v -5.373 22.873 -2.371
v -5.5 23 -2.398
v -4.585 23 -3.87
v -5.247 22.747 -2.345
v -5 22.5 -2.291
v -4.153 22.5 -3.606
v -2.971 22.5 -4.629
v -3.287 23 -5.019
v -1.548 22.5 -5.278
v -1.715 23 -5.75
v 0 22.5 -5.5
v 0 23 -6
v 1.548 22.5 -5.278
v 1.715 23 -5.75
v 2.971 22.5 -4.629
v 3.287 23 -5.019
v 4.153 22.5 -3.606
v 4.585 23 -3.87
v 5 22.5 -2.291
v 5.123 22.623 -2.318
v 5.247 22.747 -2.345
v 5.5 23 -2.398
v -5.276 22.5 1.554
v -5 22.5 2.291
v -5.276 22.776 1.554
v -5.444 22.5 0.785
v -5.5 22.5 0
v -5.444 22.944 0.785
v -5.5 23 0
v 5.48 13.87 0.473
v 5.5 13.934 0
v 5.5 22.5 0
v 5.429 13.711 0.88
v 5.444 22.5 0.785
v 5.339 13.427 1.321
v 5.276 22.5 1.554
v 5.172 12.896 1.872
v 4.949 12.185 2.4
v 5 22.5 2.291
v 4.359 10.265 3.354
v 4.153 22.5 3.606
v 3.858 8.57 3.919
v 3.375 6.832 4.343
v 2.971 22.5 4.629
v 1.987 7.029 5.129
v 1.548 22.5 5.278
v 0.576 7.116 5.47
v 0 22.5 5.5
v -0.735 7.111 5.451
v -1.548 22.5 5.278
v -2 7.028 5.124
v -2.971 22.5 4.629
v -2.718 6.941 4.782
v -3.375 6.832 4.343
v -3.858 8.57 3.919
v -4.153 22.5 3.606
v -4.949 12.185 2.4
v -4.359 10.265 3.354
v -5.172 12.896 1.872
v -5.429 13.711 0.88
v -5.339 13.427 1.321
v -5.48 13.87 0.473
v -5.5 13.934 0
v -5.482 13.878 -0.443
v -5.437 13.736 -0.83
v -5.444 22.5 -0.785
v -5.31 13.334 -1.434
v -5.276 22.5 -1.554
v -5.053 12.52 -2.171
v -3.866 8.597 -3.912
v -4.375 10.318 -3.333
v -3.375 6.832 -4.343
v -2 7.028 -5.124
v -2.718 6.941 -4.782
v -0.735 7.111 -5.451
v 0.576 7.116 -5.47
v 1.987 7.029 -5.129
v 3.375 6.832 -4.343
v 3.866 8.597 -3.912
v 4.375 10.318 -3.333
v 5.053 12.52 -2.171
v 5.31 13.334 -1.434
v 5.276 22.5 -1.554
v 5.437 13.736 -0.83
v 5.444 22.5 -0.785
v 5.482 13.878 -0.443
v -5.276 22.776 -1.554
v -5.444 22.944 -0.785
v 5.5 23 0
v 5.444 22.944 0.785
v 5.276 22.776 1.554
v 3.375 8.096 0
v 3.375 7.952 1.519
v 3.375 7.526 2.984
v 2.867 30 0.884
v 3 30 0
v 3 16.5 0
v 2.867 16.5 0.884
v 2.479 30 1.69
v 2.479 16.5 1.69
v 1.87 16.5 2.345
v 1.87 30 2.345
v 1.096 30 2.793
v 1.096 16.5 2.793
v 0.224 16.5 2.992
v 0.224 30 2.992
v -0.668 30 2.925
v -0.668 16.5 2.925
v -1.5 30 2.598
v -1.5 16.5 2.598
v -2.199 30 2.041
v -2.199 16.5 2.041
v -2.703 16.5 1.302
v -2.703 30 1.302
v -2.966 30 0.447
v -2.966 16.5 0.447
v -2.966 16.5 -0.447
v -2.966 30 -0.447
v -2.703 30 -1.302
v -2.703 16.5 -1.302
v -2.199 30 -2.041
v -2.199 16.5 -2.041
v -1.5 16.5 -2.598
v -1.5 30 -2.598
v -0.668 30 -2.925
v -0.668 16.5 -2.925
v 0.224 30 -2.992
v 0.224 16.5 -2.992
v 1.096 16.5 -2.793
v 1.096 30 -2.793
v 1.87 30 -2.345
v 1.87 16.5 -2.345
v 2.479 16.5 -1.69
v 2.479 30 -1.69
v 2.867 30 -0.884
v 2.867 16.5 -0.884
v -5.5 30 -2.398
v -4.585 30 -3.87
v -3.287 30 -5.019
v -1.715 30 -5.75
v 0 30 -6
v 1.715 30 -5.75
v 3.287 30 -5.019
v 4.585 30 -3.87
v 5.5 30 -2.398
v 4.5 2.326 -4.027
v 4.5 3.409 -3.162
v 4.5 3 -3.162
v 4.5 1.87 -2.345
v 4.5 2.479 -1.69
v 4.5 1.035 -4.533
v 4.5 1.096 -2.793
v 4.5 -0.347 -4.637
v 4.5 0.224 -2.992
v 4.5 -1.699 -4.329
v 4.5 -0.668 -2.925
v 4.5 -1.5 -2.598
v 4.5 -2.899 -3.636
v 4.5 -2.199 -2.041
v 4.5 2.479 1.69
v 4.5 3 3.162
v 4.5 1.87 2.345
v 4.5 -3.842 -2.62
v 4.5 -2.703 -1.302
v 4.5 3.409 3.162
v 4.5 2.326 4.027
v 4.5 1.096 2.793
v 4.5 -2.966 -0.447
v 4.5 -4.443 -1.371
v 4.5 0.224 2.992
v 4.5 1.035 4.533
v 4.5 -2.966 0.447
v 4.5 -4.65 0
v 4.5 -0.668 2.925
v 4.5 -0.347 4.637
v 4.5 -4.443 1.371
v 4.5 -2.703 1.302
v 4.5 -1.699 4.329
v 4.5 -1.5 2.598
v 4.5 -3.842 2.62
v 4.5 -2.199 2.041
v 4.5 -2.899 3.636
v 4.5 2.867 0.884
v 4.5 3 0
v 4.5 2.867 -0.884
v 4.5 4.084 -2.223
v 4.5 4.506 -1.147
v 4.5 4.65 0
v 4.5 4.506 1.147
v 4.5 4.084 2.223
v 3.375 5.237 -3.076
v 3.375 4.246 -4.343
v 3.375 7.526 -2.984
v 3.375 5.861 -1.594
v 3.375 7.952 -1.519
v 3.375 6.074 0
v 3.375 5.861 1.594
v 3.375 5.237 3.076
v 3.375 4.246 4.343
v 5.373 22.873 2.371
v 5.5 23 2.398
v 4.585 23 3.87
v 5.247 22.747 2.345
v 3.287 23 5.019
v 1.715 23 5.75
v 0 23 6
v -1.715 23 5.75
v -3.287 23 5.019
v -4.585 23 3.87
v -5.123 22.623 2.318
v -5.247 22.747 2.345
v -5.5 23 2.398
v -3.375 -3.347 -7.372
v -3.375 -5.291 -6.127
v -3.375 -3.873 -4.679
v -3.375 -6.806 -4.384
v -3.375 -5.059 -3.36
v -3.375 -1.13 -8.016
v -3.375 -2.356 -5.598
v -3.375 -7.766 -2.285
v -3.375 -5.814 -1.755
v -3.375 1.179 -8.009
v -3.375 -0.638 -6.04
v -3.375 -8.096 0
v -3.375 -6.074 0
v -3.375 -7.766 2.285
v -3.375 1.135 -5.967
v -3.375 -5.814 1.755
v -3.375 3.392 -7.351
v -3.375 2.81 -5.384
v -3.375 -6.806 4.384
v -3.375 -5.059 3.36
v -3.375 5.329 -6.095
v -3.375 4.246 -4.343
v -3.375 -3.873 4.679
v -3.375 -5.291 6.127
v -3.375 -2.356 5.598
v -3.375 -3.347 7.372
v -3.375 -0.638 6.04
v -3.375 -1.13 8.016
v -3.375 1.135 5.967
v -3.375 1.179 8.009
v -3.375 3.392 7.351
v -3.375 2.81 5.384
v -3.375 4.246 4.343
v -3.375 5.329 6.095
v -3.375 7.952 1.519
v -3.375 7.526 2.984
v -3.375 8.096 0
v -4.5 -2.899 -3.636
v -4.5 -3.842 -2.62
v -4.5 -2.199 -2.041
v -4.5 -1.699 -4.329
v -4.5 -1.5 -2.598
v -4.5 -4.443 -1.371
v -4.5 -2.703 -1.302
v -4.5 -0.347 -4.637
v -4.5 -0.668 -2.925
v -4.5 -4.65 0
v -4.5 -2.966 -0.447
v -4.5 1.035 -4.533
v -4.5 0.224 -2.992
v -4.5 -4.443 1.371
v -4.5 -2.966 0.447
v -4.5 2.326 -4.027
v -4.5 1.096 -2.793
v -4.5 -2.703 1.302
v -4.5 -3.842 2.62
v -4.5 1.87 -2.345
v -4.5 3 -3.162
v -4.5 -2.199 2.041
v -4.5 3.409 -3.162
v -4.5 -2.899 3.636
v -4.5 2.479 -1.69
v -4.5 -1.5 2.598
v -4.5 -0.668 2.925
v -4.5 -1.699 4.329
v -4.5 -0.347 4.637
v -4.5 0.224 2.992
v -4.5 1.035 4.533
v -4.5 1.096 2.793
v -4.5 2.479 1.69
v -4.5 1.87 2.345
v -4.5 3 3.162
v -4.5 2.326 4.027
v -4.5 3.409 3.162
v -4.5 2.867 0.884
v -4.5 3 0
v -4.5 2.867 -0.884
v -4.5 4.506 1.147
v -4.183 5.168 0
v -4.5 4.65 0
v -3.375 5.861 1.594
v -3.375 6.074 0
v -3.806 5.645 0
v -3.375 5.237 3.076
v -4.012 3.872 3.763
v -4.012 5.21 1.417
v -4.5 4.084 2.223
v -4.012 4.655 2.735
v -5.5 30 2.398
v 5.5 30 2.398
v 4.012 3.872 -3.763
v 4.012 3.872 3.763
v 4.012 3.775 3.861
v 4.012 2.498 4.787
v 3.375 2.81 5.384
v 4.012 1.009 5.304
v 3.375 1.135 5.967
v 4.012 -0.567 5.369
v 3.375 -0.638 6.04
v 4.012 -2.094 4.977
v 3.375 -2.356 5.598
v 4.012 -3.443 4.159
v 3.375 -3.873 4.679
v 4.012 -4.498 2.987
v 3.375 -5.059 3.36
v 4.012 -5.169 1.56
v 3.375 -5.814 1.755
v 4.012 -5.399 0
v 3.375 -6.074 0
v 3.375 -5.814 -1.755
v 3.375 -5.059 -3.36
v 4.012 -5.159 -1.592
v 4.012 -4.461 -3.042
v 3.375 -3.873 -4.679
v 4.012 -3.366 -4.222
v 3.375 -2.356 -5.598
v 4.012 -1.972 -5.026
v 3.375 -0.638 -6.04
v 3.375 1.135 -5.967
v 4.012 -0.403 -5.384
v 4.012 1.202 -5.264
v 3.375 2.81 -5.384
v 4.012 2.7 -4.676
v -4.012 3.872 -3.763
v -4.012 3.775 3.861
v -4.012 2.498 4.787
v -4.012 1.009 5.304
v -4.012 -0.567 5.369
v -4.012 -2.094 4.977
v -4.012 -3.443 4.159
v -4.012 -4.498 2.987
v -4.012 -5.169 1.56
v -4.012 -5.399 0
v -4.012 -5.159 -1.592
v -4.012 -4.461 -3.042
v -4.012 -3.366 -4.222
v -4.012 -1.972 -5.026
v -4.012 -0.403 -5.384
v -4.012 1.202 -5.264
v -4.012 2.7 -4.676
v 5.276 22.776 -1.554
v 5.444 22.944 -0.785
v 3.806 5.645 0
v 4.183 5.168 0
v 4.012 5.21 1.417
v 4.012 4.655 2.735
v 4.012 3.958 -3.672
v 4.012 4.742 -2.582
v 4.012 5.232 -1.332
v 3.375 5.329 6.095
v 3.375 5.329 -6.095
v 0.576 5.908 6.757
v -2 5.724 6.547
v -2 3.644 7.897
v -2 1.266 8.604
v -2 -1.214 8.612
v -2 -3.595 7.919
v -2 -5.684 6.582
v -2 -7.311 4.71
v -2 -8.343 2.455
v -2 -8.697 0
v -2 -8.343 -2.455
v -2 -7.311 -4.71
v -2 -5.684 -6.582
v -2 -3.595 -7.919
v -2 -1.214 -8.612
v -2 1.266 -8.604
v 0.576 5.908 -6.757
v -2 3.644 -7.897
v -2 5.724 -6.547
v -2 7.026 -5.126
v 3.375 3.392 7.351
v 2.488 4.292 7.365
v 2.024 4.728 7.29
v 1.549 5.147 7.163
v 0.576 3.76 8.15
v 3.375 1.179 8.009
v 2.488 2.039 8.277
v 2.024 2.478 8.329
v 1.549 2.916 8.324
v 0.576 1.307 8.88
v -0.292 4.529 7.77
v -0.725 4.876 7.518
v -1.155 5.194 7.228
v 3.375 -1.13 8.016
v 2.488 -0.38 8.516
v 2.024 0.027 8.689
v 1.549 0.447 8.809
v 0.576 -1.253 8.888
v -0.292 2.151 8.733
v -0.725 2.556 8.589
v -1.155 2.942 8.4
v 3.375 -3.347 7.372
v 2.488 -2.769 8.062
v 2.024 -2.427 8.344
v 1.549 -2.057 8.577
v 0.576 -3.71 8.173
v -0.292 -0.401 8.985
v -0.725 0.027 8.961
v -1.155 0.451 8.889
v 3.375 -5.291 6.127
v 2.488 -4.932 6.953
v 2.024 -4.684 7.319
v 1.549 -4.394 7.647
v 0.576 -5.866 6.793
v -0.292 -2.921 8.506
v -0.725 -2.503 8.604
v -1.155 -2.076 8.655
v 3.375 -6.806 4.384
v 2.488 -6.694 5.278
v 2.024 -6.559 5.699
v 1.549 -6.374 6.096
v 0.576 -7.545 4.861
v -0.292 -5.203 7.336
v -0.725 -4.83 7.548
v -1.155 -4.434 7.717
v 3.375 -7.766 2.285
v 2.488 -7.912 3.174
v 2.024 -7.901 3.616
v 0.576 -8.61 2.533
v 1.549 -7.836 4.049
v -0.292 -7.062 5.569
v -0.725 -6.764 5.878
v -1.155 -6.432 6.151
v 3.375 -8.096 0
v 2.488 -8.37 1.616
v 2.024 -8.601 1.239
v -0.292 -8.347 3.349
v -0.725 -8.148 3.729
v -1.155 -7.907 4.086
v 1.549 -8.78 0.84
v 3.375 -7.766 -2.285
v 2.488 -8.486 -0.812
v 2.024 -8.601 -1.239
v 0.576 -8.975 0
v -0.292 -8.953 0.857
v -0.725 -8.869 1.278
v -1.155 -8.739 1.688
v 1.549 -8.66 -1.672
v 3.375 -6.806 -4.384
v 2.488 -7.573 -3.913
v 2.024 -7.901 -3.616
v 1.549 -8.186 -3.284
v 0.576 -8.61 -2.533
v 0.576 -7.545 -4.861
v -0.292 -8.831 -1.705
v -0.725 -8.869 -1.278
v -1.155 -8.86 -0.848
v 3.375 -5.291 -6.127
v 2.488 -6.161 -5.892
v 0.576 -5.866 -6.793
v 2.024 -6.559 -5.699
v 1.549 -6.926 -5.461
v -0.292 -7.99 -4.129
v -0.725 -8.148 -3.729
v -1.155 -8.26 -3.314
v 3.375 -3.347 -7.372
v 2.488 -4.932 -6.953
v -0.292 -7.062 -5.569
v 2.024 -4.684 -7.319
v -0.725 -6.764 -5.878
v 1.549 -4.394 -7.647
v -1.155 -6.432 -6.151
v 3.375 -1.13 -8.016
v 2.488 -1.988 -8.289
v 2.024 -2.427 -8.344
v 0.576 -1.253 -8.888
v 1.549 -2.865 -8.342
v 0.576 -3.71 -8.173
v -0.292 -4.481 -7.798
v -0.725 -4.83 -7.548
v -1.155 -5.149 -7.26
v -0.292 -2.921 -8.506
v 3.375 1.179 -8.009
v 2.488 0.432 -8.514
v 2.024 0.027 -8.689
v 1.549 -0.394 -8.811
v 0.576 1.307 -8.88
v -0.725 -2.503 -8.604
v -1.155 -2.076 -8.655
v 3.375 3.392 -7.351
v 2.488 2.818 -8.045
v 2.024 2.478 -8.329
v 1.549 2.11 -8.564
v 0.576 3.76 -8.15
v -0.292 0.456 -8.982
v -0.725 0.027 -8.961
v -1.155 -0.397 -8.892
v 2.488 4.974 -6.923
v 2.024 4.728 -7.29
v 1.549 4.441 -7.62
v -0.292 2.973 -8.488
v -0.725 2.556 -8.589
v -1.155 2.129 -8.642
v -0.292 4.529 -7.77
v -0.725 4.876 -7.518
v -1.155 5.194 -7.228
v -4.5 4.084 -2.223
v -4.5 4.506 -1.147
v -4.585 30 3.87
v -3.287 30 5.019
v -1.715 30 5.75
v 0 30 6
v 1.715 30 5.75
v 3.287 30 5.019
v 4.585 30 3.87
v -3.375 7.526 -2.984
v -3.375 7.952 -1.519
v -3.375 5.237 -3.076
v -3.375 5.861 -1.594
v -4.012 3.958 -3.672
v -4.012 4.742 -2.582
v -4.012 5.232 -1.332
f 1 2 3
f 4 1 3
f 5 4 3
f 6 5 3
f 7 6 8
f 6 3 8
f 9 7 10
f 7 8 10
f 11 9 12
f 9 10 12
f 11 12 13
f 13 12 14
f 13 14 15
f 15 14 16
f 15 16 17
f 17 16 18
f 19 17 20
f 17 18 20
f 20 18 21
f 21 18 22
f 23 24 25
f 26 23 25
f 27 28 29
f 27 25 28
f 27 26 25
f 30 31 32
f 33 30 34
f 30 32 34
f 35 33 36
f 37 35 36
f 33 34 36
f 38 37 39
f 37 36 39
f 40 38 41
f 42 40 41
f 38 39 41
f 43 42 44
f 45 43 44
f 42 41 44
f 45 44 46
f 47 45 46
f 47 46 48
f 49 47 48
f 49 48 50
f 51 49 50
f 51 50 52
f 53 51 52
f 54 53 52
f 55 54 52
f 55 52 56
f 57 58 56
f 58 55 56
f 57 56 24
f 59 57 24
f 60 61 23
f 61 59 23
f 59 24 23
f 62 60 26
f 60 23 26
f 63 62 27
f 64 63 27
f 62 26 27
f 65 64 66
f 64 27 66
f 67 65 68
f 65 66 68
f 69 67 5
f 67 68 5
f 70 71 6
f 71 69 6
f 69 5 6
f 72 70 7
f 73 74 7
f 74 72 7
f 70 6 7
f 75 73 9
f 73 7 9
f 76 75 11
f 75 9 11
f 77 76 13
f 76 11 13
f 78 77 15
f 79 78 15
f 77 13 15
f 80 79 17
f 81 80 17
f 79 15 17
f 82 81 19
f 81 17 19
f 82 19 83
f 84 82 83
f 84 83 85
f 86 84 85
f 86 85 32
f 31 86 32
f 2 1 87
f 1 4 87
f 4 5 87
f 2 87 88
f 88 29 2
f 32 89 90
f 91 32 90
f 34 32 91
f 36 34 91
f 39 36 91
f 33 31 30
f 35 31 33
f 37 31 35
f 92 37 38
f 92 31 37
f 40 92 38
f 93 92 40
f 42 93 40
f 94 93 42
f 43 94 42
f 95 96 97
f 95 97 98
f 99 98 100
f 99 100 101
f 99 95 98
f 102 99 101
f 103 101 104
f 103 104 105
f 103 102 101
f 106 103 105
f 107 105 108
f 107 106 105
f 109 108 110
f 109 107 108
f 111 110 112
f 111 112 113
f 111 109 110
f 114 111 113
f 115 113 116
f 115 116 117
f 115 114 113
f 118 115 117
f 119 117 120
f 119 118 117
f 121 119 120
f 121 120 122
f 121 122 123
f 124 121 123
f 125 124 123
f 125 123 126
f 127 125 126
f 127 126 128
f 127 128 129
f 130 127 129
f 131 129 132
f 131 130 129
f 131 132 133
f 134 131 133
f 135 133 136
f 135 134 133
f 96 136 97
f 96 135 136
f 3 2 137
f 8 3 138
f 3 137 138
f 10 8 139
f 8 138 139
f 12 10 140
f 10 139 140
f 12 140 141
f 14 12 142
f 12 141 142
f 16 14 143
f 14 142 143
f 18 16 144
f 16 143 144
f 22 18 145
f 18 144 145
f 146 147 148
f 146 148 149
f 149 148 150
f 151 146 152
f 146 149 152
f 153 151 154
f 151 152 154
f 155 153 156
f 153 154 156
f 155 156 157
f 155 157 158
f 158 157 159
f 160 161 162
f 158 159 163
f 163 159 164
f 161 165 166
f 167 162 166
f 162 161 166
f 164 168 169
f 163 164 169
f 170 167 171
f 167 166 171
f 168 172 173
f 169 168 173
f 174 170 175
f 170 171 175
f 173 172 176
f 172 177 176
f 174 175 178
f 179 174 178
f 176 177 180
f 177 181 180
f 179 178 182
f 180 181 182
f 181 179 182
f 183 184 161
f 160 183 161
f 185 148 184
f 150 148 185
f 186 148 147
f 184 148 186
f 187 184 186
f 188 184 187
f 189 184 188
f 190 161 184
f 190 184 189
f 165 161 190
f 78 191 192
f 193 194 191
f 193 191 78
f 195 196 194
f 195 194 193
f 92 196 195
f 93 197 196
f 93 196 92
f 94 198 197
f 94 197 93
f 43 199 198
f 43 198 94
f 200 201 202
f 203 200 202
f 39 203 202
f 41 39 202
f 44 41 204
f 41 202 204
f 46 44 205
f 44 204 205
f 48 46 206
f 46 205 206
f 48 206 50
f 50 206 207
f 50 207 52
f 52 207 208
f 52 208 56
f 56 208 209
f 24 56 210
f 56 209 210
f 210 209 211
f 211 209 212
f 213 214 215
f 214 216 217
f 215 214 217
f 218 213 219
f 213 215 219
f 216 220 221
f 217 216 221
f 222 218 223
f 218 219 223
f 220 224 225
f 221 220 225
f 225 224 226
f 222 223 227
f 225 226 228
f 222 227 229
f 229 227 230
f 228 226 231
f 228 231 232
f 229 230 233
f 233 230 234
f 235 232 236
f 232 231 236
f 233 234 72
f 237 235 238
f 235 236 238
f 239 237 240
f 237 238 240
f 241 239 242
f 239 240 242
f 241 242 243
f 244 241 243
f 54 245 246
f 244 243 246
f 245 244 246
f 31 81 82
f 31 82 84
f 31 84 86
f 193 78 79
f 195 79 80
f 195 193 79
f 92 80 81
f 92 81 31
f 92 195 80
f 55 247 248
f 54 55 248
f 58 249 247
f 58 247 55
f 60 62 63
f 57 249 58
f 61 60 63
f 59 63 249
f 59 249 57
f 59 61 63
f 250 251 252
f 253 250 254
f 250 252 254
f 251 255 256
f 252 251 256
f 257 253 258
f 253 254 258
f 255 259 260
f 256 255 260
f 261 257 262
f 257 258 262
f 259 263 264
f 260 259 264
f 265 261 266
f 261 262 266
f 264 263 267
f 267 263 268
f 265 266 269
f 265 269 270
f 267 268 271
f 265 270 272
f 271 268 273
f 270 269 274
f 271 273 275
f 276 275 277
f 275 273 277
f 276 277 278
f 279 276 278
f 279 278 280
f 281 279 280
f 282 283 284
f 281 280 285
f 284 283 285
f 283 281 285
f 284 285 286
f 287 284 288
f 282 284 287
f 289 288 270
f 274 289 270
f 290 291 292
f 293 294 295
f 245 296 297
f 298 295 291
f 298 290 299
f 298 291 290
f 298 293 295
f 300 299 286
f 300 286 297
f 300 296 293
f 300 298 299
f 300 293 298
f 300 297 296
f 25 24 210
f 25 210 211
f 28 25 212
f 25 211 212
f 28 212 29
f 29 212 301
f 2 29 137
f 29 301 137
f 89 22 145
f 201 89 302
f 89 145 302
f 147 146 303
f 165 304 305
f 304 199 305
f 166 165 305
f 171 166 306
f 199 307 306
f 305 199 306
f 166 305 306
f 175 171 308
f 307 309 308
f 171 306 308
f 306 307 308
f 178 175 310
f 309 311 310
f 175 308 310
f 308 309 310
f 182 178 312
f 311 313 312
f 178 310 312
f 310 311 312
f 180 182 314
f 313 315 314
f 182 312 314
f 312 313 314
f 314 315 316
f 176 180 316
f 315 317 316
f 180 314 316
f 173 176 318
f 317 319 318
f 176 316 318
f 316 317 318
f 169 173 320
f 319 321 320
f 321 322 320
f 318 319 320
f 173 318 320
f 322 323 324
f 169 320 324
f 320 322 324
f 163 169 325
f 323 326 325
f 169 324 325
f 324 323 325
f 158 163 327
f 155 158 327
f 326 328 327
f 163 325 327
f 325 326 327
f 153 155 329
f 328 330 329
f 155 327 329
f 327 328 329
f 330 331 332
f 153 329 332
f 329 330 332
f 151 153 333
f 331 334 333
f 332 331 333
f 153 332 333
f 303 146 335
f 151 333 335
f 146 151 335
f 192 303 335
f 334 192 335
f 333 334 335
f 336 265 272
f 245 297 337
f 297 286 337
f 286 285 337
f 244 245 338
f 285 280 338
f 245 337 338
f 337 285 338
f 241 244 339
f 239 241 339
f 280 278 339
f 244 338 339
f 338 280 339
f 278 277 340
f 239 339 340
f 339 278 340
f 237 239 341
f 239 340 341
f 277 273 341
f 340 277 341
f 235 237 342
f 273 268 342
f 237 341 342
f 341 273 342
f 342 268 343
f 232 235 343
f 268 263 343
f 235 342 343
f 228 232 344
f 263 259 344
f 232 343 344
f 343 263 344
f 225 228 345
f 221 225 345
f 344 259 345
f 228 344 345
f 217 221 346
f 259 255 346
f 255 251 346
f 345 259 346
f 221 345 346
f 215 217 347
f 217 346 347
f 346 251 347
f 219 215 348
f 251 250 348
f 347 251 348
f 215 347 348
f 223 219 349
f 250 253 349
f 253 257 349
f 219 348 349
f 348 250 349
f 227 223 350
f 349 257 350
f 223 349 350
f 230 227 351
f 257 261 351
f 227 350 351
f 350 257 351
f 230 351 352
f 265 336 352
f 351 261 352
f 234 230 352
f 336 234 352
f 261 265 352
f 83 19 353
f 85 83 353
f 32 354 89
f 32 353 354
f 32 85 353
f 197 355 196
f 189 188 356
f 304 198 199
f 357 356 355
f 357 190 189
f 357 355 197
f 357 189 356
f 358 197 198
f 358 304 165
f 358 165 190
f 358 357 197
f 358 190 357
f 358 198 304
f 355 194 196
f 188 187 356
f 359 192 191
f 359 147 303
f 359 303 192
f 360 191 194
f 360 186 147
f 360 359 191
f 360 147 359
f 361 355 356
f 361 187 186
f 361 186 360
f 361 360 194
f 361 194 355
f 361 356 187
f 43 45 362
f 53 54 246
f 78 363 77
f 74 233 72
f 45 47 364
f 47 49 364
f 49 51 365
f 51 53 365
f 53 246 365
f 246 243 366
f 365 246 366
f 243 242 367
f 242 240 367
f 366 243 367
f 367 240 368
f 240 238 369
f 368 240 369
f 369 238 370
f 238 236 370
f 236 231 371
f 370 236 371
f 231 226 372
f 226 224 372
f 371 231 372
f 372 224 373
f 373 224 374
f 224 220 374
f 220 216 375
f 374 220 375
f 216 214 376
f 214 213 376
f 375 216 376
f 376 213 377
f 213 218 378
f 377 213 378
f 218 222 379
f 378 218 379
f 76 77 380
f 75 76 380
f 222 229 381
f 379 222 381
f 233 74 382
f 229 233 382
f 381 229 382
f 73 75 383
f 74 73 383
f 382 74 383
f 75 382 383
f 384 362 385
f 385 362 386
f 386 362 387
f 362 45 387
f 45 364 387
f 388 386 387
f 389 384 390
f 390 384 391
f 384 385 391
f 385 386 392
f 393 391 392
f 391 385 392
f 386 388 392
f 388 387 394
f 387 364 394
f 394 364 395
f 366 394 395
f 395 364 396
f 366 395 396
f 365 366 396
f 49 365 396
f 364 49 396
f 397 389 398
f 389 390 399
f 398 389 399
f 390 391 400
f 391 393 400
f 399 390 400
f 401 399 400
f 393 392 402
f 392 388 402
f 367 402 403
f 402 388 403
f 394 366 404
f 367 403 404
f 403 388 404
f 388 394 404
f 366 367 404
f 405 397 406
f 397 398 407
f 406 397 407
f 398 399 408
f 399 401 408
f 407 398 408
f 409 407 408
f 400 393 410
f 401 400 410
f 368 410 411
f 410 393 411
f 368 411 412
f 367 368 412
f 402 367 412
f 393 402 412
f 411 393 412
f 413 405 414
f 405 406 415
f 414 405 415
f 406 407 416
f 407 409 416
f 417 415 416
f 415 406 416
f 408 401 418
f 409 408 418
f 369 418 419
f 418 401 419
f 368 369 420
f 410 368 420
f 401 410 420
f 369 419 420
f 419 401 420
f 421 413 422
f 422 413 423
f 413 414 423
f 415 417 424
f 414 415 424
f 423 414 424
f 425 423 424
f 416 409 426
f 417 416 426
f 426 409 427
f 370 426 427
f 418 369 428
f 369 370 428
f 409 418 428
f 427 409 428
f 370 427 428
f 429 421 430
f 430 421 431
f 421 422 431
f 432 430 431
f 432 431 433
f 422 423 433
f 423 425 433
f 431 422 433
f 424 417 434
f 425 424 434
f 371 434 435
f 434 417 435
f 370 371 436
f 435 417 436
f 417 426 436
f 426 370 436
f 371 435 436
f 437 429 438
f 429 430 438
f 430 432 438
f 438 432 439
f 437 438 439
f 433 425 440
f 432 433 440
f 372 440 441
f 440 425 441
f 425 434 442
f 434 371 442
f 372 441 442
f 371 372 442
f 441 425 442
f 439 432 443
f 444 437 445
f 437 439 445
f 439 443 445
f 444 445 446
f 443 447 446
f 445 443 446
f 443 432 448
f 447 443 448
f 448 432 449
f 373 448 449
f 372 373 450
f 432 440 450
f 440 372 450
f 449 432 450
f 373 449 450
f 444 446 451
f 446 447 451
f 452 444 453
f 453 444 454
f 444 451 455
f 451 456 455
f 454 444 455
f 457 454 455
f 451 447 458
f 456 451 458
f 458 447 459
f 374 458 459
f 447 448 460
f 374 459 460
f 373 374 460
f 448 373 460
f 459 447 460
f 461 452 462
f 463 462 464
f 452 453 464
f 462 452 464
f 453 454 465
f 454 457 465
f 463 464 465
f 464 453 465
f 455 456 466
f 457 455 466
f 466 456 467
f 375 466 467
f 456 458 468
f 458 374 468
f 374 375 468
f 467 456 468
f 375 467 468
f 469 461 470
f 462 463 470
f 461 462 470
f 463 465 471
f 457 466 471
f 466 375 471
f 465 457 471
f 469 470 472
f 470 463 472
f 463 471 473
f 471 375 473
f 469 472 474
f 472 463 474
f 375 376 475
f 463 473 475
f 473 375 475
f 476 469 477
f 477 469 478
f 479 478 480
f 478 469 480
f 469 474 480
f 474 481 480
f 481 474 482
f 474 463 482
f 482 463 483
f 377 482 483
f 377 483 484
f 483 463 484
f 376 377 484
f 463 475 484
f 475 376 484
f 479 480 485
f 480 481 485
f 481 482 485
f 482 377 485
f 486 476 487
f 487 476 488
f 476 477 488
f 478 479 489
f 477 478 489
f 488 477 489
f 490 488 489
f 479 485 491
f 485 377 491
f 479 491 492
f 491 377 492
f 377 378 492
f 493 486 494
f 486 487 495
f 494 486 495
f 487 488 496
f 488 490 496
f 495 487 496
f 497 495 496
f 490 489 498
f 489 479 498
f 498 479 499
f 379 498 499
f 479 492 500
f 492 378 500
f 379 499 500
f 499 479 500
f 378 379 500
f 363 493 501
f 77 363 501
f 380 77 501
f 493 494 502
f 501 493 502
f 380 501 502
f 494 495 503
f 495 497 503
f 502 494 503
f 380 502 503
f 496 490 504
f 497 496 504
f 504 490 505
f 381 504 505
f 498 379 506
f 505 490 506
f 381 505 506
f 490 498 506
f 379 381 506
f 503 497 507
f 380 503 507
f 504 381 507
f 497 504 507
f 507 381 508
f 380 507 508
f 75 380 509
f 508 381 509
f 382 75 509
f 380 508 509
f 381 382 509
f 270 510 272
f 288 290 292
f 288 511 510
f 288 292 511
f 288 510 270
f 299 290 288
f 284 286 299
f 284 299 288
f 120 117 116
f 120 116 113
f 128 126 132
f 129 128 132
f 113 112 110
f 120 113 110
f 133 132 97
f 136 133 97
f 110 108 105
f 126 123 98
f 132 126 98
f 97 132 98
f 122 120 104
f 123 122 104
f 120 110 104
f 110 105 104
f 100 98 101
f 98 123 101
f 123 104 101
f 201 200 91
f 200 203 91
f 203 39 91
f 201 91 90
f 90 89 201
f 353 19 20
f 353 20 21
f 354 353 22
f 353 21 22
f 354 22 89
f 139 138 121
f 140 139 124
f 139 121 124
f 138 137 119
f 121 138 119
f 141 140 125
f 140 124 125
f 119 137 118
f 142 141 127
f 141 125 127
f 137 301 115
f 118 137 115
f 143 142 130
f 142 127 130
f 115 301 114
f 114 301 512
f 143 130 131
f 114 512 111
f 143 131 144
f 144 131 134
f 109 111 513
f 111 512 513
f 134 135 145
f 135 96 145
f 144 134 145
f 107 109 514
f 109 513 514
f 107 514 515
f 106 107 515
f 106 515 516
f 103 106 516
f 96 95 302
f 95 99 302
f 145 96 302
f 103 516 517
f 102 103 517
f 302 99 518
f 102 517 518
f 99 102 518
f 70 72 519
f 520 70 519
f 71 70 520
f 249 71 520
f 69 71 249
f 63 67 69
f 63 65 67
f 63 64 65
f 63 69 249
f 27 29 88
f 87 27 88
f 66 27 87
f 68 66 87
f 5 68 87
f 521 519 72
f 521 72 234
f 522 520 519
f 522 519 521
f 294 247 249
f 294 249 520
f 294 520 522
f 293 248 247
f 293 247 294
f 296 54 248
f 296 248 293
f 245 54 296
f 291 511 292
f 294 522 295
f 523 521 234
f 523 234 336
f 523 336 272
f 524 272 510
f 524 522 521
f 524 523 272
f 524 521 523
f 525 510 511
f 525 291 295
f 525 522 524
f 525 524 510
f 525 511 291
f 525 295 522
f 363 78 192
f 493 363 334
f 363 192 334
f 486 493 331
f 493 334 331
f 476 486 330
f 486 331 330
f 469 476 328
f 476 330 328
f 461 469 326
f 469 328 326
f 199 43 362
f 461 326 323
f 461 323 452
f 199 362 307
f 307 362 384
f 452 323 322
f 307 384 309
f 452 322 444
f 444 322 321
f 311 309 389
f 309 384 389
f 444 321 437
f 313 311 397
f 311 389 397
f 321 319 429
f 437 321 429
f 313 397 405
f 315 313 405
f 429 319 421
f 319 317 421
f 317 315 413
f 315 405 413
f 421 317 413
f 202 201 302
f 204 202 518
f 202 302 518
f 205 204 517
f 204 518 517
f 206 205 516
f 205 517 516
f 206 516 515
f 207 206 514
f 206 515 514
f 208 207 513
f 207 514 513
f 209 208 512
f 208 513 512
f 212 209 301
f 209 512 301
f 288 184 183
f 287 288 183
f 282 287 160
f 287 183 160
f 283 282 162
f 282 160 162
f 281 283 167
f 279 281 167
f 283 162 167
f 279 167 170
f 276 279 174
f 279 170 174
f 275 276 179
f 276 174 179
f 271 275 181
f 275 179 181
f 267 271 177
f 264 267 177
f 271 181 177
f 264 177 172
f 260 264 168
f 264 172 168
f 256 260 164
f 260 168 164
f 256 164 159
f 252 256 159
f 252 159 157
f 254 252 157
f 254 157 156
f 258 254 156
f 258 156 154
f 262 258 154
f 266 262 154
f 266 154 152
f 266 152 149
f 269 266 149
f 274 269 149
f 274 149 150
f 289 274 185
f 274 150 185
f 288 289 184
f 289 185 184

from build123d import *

# Parameters (mm, degrees)
F9_R          = 3
F10_DEPTH     = 27
F11_DEPTH     = 7.5
F12_DEPTH     = 13.5
F13_T2_ANGLE  = 157.4663491
F13_T6_DEPTH  = 3.6837572556
F13_S7_R      = 5.5
F13_T8_DEPTH  = 3
F13_T12_DEPTH = 3.6837572556
F13_S13_R     = 5.5
F13_T14_DEPTH = 3
F13_T16_ANGLE = 157.4663491
F13_T20_DEPTH = 3.6837572556
F13_S21_R     = 5.5
F13_T22_DEPTH = 3
F13_T26_DEPTH = 3.6837572556
F13_S27_R     = 5.5
F13_T28_DEPTH = 3


# Not quite as in the source:
# - a fillet or chamfer that OpenCascade refuses, or shapes differently, is made with other operations: its cross-section is extruded or revolved along the edge and cut away or added


with BuildPart() as f7:
    # F6 (on Top) → F7 (revolve)
    with BuildSketch(Plane.XY):
        with BuildLine():
            Line((-4.5, 4.65), (-4.5, 3))
            Line((-4.5, 3), (4.5, 3))
            Line((4.5, 3), (4.5, 4.65))
            ThreePointArc((4.5, 4.65), (4.0013141648, 5.4121962233), (3.375, 6.073529129))
            ThreePointArc((3.375, 6.073529129), (0, 7.35), (-3.375, 6.073529129))
            ThreePointArc((-3.375, 6.073529129), (-4.0013141648, 5.4121962233), (-4.5, 4.65))
        make_face()
        with BuildLine():
            Line((-3.375, 8.0956714755), (-3.375, 6.073529129))
            ThreePointArc((-3.375, 6.073529129), (0, 7.35), (3.375, 6.073529129))
            Line((3.375, 6.073529129), (3.375, 8.0956714755))
            ThreePointArc((3.375, 8.0956714755), (0, 9), (-3.375, 8.0956714755))
        make_face()
    revolve(axis=Axis((0, 0, 0), (1, 0, 0)))

    # F9 (on offset) → F10 (join)
    with BuildSketch(Plane.XZ.offset(-30)):
        with BuildLine():
            ThreePointArc((-5.5, 0), (0, -5.5), (5.5, 0))
            ThreePointArc((5.5, 0), (0, 5.5), (-5.5, 0))
        make_face()
        Circle(F9_R, mode=Mode.SUBTRACT)
        Circle(F9_R)
    extrude(amount=F10_DEPTH)

    # F9 (on offset) → F11 (join)
    with BuildSketch(Plane.XZ.offset(-30)):
        with BuildLine():
            ThreePointArc((-5.5, 0), (0, 5.5), (5.5, 0))
            Line((5.5, 0), (5.5, 2.3979157617))
            ThreePointArc((5.5, 2.3979157617), (0, 6), (-5.5, 2.3979157617))
            Line((-5.5, 2.3979157617), (-5.5, 0))
        make_face()
        with BuildLine():
            Line((5.5, -2.3979157617), (5.5, 0))
            ThreePointArc((5.5, 0), (0, -5.5), (-5.5, 0))
            Line((-5.5, 0), (-5.5, -2.3979157617))
            ThreePointArc((-5.5, -2.3979157617), (0, -6), (5.5, -2.3979157617))
        make_face()
    extrude(amount=F11_DEPTH)

    # F9 (on offset) → F12 (cut)
    with BuildSketch(Plane.XZ.offset(-30)):
        Circle(F9_R)
    extrude(amount=F12_DEPTH, mode=Mode.SUBTRACT)

    # F13: chamfer of 0.5 on 6 edges, made by hand

    # F13_s1 → F13_t2 (revolve, cut)
    with BuildSketch(Plane(origin=(0, 0, 0), x_dir=(0, 1, 0), z_dir=(0.1953783305, 0, -0.980727948))):
        Polygon((22.5, 5.5), (23, 6), (22.5, 6), align=None)
    revolve(axis=Axis((0, 22.5, 0), (0, -1, 0)), revolution_arc=F13_T2_ANGLE, mode=Mode.SUBTRACT)


with BuildPart() as f13_tool4:
    # F13_s5 → F13_t6 (new body)
    with BuildSketch(Plane.XY):
        Polygon((5, 22.5), (5.5, 23), (5.5, 22.5), align=None)
    extrude(amount=F13_T6_DEPTH)

    # F13_s7 → F13_t8 (cut, symmetric)
    with BuildSketch(Plane.XZ.offset(-22.8)):
        Circle(F13_S7_R)
    extrude(amount=F13_T8_DEPTH, both=True, mode=Mode.SUBTRACT)


with BuildPart() as f7_1:
    add(f7.part)

    # F13_t3: cut F13_tool4
    add(f13_tool4.part, mode=Mode.SUBTRACT)


with BuildPart() as f13_tool10:
    # F13_s11 → F13_t12 (new body)
    with BuildSketch(Plane.XY.offset(3.6837572556)):
        Polygon((-5, 22.5), (-5.5, 23), (-5.5, 22.5), align=None)
    extrude(amount=-F13_T12_DEPTH)

    # F13_s13 → F13_t14 (cut, symmetric)
    with BuildSketch(Plane.XZ.offset(-22.8)):
        Circle(F13_S13_R)
    extrude(amount=F13_T14_DEPTH, both=True, mode=Mode.SUBTRACT)


with BuildPart() as f7_2:
    add(f7_1.part)

    # F13_t9: cut F13_tool10
    add(f13_tool10.part, mode=Mode.SUBTRACT)

    # F13_s15 → F13_t16 (revolve, cut)
    with BuildSketch(Plane(origin=(0, 0, 0), x_dir=(0, 1, 0), z_dir=(-0.1953783305, 0, 0.980727948))):
        Polygon((22.5, 5.5), (23, 6), (22.5, 6), align=None)
    revolve(axis=Axis((0, 22.5, 0), (0, -1, 0)), revolution_arc=F13_T16_ANGLE, mode=Mode.SUBTRACT)


with BuildPart() as f13_tool18:
    # F13_s19 → F13_t20 (new body)
    with BuildSketch(Plane.XY.offset(-3.6837572556)):
        Polygon((5, 22.5), (5.5, 23), (5.5, 22.5), align=None)
    extrude(amount=F13_T20_DEPTH)

    # F13_s21 → F13_t22 (cut, symmetric)
    with BuildSketch(Plane.XZ.offset(-22.8)):
        Circle(F13_S21_R)
    extrude(amount=F13_T22_DEPTH, both=True, mode=Mode.SUBTRACT)


with BuildPart() as f7_3:
    add(f7_2.part)

    # F13_t17: cut F13_tool18
    add(f13_tool18.part, mode=Mode.SUBTRACT)


with BuildPart() as f13_tool24:
    # F13_s25 → F13_t26 (new body)
    with BuildSketch(Plane.XY):
        Polygon((-5, 22.5), (-5.5, 23), (-5.5, 22.5), align=None)
    extrude(amount=-F13_T26_DEPTH)

    # F13_s27 → F13_t28 (cut, symmetric)
    with BuildSketch(Plane.XZ.offset(-22.8)):
        Circle(F13_S27_R)
    extrude(amount=F13_T28_DEPTH, both=True, mode=Mode.SUBTRACT)


with BuildPart() as f7_4:
    add(f7_3.part)

    # F13_t23: cut F13_tool24
    add(f13_tool24.part, mode=Mode.SUBTRACT)

    # F6 (on Top) → F14 (revolve, cut)
    with BuildSketch(Plane.XY):
        with BuildLine():
            Line((4.5, 4.65), (4.5, 3))
            Line((4.5, 3), (6.5, 3))
            Line((6.5, 3), (6.5, 16.6815384113))
            Line((6.5, 16.6815384113), (3.375, 8.0956714755))
            Line((3.375, 8.0956714755), (3.375, 6.073529129))
            ThreePointArc((3.375, 6.073529129), (4.0013141648, 5.4121962233), (4.5, 4.65))
        make_face()
        with BuildLine():
            Line((-6.5, 3), (-4.5, 3))
            Line((-4.5, 3), (-4.5, 4.65))
            ThreePointArc((-4.5, 4.65), (-4.0013141648, 5.4121962233), (-3.375, 6.073529129))
            Line((-3.375, 6.073529129), (-3.375, 8.0956714755))
            Line((-3.375, 8.0956714755), (-6.5, 16.6815384113))
            Line((-6.5, 16.6815384113), (-6.5, 3))
        make_face()
    revolve(axis=Axis((0, 0, 0), (1, 0, 0)), mode=Mode.SUBTRACT)


solid = f7_4.part
